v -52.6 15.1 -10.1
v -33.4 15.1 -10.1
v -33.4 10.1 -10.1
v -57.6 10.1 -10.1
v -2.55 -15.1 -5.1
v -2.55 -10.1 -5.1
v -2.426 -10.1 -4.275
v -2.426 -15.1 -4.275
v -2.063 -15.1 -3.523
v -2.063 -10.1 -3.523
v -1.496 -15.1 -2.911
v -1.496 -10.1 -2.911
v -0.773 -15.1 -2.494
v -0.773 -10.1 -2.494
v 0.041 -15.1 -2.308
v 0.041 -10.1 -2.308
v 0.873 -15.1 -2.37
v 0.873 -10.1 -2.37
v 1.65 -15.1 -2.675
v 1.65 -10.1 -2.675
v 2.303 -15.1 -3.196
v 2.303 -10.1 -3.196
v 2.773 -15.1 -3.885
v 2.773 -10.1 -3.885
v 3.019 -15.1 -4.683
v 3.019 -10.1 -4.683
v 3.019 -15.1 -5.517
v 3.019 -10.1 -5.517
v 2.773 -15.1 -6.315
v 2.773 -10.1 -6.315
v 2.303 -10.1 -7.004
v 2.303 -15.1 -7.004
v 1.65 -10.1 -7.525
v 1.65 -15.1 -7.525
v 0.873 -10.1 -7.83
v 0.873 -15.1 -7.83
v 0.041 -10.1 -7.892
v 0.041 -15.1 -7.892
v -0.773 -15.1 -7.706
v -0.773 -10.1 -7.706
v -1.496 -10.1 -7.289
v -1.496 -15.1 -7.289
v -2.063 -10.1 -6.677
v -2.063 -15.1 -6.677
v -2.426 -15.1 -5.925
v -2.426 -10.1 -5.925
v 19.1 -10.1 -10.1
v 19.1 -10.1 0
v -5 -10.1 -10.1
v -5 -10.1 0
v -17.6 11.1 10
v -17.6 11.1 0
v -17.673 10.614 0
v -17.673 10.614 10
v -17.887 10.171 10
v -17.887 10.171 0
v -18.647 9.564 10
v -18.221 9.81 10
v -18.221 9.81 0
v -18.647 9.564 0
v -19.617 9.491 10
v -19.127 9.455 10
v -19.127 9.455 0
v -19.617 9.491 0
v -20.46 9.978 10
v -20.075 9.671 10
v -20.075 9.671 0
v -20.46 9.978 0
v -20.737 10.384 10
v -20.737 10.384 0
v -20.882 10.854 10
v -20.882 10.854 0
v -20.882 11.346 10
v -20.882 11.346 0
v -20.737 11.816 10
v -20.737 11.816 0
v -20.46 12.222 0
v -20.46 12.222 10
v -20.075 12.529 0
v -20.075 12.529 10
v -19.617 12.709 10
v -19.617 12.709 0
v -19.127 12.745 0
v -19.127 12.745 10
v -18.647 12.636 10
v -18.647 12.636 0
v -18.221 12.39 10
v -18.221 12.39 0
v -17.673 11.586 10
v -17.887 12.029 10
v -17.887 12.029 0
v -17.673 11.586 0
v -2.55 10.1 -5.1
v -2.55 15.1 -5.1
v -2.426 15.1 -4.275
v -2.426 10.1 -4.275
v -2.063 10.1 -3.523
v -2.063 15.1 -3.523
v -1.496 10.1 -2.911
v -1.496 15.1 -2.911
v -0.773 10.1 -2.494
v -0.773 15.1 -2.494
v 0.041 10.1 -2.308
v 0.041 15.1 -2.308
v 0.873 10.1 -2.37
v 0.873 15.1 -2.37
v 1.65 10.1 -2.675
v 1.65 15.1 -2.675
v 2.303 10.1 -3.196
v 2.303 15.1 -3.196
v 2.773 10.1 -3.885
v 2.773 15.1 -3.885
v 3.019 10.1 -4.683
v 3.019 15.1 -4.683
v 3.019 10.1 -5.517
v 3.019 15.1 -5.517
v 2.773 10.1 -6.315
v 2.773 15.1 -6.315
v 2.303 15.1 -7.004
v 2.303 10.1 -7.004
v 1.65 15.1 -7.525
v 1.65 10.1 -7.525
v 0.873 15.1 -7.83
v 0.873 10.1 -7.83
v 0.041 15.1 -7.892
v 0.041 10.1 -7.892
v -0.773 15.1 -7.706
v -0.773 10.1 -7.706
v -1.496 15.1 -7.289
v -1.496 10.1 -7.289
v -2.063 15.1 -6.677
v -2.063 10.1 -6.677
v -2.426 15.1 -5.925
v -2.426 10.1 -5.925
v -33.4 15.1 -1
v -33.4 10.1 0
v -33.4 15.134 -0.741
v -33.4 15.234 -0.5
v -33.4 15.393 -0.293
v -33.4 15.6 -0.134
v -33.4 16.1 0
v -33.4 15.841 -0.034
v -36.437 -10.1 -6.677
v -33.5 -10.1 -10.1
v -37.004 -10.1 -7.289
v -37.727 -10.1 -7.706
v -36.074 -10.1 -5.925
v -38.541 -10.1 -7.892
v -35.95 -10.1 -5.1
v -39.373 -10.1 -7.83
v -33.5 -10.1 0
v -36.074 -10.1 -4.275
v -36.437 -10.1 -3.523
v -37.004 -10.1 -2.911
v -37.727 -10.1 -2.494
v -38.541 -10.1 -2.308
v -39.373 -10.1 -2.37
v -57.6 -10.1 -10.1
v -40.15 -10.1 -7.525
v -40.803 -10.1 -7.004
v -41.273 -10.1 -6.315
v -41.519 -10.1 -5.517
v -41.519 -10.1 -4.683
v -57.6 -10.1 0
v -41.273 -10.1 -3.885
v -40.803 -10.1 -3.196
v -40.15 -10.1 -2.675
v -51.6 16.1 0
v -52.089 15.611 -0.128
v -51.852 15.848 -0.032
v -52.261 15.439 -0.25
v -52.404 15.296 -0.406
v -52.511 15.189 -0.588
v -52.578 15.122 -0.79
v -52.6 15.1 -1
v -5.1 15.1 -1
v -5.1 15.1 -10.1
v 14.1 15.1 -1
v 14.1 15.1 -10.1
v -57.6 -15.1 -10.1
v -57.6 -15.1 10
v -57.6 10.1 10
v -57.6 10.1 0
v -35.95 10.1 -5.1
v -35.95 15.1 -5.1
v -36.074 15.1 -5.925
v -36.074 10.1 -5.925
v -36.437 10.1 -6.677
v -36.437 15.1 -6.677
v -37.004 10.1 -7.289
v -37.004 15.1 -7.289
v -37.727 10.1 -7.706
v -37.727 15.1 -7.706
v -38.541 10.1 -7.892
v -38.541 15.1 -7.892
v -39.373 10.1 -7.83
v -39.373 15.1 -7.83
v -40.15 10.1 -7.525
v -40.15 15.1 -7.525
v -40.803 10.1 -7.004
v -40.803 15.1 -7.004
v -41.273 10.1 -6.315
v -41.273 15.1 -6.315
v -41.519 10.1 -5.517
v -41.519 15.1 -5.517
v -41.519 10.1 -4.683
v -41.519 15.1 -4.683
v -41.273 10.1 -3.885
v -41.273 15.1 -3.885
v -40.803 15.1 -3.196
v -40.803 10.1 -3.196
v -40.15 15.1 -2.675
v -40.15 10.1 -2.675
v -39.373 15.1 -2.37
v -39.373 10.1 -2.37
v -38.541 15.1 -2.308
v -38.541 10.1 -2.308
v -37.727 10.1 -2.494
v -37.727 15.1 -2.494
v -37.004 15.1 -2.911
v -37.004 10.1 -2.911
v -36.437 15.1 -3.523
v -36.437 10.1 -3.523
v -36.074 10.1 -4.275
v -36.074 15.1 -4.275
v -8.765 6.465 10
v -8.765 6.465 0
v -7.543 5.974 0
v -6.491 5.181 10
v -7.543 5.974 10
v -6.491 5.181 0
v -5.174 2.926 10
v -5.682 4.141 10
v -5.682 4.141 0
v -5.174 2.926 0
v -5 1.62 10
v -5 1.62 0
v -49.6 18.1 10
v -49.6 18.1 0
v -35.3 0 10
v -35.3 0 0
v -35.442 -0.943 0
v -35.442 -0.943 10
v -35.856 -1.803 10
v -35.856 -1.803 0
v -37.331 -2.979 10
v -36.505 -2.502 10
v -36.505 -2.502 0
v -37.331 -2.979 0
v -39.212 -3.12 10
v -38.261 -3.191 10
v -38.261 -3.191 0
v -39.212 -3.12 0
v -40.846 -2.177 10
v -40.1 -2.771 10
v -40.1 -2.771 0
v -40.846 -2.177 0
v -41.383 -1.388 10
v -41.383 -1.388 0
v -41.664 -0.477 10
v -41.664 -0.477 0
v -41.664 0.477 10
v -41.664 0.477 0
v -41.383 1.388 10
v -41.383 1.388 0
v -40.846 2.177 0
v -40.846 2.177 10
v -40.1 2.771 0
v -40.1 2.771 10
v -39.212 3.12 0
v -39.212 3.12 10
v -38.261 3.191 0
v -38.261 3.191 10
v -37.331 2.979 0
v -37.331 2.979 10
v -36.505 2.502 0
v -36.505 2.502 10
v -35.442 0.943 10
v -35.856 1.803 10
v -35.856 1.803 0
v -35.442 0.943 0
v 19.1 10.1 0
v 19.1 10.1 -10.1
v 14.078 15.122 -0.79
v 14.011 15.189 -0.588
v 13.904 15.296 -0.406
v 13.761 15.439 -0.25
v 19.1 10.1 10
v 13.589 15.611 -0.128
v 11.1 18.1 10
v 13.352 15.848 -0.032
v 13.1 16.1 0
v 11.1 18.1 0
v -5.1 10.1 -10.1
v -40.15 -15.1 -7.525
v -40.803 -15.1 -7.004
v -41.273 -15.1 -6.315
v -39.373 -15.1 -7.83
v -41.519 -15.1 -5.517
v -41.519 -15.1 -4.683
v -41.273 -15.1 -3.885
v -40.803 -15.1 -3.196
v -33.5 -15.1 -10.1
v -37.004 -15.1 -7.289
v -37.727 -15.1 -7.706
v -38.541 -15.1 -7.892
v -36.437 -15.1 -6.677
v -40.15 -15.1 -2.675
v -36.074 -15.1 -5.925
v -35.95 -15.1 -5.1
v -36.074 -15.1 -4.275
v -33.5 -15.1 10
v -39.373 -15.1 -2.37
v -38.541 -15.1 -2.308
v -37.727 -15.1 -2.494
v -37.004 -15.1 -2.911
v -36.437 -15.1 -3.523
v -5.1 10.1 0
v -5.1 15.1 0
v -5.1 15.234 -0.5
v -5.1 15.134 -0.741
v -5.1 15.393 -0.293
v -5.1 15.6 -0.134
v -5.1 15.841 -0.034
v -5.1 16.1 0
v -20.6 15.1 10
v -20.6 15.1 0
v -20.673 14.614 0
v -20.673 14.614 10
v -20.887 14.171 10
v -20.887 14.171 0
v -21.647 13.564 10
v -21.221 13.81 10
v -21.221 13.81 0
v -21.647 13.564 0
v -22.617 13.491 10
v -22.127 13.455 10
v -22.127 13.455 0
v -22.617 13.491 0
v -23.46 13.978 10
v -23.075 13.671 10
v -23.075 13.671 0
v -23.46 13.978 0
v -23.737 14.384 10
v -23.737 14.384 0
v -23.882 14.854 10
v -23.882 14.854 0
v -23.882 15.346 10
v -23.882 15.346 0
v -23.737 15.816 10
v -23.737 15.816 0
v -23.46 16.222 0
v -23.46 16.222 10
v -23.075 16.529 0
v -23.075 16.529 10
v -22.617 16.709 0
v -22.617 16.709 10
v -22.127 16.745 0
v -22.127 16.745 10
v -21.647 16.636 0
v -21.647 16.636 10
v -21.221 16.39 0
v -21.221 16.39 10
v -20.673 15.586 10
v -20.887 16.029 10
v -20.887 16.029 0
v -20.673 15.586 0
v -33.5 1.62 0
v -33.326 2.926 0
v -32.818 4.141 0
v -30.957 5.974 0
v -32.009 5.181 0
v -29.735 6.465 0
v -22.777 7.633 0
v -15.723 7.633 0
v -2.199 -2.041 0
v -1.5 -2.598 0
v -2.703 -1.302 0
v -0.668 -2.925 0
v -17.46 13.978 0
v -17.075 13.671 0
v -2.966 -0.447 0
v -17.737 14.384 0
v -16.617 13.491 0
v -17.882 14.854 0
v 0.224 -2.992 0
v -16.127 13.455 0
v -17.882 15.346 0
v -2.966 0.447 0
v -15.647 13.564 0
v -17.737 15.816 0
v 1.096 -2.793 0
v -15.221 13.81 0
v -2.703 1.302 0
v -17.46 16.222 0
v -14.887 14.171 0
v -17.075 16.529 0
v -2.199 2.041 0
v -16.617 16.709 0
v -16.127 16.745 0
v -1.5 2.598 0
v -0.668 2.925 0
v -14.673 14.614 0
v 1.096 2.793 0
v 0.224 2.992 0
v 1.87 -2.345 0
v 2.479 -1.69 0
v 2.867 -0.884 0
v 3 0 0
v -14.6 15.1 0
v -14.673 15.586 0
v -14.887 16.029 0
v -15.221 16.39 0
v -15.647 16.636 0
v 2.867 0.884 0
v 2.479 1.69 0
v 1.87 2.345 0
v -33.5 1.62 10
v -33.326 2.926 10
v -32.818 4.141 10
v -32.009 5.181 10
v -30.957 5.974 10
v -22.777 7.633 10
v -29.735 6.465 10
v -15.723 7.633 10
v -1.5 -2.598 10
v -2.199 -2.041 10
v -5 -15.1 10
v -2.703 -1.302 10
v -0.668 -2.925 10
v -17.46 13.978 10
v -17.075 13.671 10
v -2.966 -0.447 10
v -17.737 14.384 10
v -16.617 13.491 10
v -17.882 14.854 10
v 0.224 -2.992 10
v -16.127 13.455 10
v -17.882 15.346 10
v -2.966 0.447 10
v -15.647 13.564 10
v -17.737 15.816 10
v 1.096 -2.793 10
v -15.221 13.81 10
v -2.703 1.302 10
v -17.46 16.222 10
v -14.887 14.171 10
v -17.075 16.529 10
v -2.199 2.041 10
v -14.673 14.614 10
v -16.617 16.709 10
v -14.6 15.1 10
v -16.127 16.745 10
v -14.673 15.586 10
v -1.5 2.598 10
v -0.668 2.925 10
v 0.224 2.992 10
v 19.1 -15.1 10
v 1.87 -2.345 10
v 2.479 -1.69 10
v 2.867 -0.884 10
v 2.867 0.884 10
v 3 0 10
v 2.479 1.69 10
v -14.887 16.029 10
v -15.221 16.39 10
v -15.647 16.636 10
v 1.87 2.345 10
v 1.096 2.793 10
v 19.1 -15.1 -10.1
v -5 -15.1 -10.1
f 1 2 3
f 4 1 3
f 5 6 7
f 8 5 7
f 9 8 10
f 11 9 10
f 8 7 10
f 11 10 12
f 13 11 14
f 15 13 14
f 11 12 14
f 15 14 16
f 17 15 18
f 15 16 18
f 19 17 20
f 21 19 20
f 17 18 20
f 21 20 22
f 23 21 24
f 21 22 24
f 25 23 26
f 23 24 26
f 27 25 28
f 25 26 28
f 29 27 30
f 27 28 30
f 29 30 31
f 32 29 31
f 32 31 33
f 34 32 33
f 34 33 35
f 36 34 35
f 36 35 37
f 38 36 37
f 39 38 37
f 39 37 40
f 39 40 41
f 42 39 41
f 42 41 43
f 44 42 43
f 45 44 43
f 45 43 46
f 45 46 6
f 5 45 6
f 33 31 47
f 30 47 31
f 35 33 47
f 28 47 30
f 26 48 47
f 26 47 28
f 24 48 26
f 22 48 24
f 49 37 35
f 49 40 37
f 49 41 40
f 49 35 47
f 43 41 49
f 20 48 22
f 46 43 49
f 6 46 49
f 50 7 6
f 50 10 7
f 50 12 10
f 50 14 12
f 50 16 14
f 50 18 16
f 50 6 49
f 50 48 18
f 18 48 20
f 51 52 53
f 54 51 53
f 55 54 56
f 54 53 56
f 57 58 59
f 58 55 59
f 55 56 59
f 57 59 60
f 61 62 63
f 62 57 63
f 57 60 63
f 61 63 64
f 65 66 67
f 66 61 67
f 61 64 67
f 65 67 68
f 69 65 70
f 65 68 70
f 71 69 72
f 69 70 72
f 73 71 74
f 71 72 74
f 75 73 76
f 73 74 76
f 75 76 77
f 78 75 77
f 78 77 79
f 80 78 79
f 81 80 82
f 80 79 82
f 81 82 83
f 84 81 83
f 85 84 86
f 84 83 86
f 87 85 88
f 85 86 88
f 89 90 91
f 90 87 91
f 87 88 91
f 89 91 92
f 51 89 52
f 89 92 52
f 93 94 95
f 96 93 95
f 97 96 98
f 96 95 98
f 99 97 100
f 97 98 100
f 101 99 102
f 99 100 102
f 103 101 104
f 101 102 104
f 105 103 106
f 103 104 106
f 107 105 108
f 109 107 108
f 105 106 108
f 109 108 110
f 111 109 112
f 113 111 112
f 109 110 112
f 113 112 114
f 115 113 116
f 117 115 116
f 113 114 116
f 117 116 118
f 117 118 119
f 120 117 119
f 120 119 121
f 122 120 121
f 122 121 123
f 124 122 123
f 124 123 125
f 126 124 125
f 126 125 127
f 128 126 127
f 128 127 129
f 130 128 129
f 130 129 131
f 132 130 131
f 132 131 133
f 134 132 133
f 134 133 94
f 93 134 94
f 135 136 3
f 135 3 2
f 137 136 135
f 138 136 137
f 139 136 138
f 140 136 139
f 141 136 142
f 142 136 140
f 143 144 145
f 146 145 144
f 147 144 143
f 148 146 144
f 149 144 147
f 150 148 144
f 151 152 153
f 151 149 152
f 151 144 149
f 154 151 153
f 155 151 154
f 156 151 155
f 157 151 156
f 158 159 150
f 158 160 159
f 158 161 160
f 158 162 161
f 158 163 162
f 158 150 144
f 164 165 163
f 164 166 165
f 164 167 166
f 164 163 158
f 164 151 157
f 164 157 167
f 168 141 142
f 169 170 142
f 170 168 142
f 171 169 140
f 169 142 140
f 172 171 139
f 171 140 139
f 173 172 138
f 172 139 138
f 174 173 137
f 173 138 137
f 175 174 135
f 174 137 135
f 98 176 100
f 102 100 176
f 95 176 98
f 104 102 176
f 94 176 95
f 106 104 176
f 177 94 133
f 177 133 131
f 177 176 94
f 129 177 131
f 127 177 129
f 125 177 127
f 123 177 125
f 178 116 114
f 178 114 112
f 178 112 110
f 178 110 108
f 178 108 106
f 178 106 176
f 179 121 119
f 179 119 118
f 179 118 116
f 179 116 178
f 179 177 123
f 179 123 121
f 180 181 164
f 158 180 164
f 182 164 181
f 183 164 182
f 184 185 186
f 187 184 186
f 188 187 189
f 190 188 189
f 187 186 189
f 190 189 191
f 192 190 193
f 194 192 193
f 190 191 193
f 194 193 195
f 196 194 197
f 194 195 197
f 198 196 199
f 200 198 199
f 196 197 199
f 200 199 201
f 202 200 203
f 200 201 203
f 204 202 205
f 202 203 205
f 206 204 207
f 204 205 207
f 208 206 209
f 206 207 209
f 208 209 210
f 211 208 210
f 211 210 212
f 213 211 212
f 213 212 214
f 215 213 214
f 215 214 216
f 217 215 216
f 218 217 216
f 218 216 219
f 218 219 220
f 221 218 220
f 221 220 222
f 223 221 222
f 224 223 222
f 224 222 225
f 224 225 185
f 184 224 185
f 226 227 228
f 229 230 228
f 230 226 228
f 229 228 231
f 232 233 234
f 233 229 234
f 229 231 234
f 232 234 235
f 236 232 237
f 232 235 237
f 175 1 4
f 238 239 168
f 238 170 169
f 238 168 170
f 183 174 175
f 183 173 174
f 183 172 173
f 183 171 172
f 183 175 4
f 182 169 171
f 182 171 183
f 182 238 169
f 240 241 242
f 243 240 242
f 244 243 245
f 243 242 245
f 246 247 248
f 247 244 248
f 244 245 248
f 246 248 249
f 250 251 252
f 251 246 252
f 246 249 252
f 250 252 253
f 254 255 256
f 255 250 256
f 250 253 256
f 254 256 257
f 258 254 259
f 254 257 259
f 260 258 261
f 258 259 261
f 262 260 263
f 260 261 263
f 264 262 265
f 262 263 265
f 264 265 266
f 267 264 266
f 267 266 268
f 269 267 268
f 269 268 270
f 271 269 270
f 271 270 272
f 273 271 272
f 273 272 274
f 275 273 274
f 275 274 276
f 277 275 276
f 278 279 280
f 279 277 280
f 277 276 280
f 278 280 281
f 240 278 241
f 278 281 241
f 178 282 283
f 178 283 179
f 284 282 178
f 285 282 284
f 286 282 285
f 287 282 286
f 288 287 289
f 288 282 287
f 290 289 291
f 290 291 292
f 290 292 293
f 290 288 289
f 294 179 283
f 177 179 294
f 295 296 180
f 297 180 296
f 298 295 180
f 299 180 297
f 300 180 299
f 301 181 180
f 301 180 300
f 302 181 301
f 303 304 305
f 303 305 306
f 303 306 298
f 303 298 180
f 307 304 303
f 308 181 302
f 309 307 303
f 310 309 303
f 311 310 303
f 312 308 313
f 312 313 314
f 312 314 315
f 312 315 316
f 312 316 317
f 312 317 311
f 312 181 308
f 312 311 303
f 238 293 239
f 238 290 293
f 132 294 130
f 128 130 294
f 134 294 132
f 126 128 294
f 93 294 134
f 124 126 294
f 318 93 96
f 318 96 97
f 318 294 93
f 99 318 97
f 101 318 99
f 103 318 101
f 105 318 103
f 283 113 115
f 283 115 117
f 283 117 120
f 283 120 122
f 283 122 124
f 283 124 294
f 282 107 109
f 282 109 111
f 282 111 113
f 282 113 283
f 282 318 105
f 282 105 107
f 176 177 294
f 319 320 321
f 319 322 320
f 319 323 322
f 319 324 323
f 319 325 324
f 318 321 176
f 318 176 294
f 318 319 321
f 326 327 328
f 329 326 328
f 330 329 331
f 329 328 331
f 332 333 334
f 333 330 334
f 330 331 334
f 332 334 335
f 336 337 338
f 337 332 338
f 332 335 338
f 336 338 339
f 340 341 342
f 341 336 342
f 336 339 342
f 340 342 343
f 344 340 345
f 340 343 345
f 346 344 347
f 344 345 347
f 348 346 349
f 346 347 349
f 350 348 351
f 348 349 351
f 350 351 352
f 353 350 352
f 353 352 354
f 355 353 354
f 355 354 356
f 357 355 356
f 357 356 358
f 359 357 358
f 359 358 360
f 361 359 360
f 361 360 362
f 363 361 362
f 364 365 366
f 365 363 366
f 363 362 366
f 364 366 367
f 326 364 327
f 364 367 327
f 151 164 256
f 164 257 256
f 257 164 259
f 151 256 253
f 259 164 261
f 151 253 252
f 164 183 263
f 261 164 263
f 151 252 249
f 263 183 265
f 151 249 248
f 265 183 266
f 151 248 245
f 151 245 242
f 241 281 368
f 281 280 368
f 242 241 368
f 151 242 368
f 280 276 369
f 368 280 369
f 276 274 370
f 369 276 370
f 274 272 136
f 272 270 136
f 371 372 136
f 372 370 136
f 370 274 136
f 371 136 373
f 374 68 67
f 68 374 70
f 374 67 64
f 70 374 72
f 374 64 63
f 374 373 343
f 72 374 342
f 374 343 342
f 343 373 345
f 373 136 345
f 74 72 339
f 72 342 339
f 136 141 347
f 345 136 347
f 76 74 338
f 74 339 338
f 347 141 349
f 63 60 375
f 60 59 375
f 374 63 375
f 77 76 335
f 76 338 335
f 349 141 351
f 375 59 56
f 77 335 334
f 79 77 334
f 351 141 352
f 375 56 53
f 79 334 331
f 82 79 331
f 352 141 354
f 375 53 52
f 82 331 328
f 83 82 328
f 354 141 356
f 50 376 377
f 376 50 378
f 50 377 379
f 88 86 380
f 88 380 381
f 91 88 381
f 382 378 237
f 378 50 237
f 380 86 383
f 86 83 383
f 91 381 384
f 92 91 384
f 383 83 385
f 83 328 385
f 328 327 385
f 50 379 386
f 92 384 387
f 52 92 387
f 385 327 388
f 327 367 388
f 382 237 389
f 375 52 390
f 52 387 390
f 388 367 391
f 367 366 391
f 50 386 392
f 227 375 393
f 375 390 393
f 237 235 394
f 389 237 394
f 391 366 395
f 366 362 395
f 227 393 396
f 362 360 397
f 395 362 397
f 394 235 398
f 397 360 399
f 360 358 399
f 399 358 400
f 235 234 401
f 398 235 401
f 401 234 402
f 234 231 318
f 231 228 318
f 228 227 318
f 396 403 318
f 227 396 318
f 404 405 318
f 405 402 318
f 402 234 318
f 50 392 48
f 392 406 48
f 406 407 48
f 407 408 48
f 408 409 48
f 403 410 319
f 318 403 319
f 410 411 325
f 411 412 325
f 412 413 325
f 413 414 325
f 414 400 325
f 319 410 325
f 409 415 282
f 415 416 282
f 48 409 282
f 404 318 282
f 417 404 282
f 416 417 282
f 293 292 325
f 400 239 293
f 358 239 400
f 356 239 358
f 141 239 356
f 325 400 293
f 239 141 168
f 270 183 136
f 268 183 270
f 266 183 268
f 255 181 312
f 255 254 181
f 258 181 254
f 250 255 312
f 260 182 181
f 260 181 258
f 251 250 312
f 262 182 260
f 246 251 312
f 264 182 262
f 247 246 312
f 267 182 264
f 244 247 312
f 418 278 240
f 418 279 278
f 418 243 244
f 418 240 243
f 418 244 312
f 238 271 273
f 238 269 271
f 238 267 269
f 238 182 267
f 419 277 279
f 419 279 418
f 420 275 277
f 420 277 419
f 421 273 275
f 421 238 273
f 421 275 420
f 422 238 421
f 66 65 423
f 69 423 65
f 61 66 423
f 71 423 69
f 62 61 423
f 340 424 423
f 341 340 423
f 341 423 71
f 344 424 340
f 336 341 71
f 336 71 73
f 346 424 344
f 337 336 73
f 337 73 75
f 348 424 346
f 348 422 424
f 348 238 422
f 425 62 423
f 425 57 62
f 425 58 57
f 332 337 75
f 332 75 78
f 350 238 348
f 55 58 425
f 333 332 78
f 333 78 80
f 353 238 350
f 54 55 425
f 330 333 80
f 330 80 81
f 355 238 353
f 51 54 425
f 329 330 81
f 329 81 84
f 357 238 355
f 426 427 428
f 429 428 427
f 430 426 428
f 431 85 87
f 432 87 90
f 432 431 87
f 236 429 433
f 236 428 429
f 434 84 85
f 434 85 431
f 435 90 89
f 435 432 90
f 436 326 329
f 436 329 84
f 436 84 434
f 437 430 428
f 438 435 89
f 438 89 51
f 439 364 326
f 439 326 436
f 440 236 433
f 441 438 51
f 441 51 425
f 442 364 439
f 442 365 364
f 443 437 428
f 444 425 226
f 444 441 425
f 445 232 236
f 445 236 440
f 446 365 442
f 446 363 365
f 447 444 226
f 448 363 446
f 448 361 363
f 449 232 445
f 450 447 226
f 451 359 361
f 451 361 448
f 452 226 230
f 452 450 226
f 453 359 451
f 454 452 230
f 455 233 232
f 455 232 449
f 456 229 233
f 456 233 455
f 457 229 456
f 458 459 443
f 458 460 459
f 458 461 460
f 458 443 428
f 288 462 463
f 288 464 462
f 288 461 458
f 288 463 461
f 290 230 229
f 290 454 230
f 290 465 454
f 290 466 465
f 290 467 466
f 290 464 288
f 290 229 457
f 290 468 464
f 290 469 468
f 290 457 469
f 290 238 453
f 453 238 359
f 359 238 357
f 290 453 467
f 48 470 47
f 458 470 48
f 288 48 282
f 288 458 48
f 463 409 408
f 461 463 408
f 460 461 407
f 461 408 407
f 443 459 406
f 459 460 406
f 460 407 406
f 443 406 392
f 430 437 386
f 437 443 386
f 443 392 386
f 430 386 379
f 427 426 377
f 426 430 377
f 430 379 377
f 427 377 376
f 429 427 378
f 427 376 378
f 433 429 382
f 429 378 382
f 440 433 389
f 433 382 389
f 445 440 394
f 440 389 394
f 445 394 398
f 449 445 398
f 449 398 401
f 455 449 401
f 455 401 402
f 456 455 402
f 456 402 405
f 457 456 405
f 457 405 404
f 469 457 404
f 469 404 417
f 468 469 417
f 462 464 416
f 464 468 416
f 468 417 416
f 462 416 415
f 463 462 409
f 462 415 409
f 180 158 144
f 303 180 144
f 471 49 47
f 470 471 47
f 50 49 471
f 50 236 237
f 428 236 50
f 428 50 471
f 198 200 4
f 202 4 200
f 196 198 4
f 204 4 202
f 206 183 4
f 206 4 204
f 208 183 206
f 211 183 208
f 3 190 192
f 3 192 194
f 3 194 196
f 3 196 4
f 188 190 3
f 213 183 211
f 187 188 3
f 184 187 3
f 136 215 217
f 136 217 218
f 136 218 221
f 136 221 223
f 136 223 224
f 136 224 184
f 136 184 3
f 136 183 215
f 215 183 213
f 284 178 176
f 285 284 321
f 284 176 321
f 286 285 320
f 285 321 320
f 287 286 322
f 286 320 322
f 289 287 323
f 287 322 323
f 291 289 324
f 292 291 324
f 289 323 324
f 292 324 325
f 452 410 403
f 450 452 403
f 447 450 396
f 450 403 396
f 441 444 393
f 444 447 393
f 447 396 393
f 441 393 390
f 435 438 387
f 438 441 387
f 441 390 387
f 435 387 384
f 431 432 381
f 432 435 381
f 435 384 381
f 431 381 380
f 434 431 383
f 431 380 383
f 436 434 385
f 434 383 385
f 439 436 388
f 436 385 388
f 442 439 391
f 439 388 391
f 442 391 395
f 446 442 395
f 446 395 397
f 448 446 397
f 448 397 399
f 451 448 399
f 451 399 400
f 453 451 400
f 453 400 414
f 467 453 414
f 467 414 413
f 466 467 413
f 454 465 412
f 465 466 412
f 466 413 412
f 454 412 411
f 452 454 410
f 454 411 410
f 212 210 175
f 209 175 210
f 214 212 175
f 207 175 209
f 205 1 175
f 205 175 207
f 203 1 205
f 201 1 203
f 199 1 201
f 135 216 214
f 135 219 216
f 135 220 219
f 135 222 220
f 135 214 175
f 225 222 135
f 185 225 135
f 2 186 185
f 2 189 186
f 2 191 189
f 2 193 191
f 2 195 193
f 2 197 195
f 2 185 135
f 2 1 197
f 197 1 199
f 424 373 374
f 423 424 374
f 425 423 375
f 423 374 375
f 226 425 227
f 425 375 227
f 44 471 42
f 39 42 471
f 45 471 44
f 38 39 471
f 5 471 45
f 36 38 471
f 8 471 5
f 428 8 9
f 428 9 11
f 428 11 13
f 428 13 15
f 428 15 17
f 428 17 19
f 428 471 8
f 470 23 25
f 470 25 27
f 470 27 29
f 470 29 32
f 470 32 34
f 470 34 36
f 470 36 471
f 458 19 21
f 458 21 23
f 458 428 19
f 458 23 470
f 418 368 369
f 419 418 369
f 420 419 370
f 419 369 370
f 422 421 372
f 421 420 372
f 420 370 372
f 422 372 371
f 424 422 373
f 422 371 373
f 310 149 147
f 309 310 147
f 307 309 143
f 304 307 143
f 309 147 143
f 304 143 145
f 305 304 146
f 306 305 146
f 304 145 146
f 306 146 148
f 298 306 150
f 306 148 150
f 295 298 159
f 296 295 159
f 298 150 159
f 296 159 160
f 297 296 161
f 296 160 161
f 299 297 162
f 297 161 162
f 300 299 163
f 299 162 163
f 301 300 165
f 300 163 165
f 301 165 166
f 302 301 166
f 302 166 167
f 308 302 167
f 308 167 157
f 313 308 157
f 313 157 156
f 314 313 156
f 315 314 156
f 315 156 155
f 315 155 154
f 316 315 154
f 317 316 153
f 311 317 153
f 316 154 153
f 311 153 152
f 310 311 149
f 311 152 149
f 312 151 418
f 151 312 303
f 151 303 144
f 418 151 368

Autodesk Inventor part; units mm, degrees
ref_plane "YZ Plane" through (0, 0, 0) normal (1, 0, 0) x (0, 1, 0)
sketch "Sketch1" plane through (0, 0, 0) normal (0, 0, 1) x (1, 0, 0)
  circle A0 centre (0, 0) radius 3.1 construction
  line L0 (-5, 10) -> (-5, -10) projected
  line L1 (-5, -10) -> (19.1, -10) construction
  line L2 (19.1, -10) -> (19.1, 10) projected
  line L3 (19.1, 10) -> (-5, 10) construction
  line L4 (-33.5, -10) -> (-33.5, 10) projected
  line L5 (-33.5, 10) -> (-57.6, 10) construction
  line L6 (-57.6, -10) -> (-57.6, 10) projected
  line L7 (-57.6, -10) -> (-33.5, -10) construction
  circle A1 centre (-38.5, 0) radius 3.1 construction
  line L8 (-25.05, 5.3172) -> (-13.45, 5.3172) projected
  line L9 (19.1, -10.1) -> (-5, -10.1)
  line L10 (-5, -10.1) -> (-5, 1.6198)
  line L11 (-5, 10.1) -> (19.1, 10.1)
  line L12 (19.1, 10.1) -> (19.1, -10.1)
  line L13 (-33.5, -10.1) -> (-57.6, -10.1)
  line L14 (-57.6, -10.1) -> (-57.6, 10.1)
  line L15 (-57.6, 10.1) -> (-33.5, 10.1)
  line L16 (-33.5, 1.6198) -> (-33.5, -10.1)
  circle A2 centre (-38.5, 0) radius 3.2
  circle A3 centre (0, 0) radius 3
  arc A4 (-8.7654, 6.465) -> (-29.7346, 6.465) centre (-19.25, -34.6828) ccw
  line L17 (11.1, 18.1) -> (-49.6, 18.1)
  line L18 (-19.25, 5.3172) -> (-19.25, 9.0349) construction
  circle A5 centre (-16.25, 15.1) radius 1.65
  circle A6 centre (-22.25, 15.1) radius 1.65
  line L19 (11.1, 18.1) -> (19.1, 10.1)
  line L20 (-49.6, 18.1) -> (-57.6, 10.1)
  arc A7 (-29.7346, 6.465) -> (-33.5, 1.6198) centre (-28.5, 1.6198) ccw
  arc A8 (-5, 1.6198) -> (-8.7654, 6.465) centre (-10, 1.6198) ccw
  circle A9 centre (-19.25, 11.1) radius 1.65
  circle A10 centre (-19.25, 11.1) radius 1.65
  point P0 (0, 0)
  point P1 (-5, 5.3172)
  point P2 (-33.5, 5.3172)
  point P3 (-19.25, 18.1)
  point P4 (-5, 5.3172)
  point P5 (19.1, 10)
  point P6 (-33.5, 1.6198)
  point P7 (-5, 1.6198)
  dimension "d0" = 0.1
  dimension "d1" = 0.1
  dimension "d2" = 0.1
  dimension "d3" = 0.1
  dimension "d4" = 0.1
  dimension "d5" = 0.1
  dimension "d7" = 40
  dimension "d9" = 8
  dimension "d10" = 3
  dimension "d11" = 3.3
  dimension "d12" = 3
  dimension "d13" = 45
  dimension "d16" = 5
  dimension "d17" = 3.3
  dimension "d19" = 7
extrude "Extrusion1" add sketch "Sketch1" along normal blind 10
ref_plane "Work Plane1" through (-43.1, -10, -10.1) normal (0, 0, -1) x (0, 1, 0)
sketch "Sketch3" plane through (0, 0, 10) normal (0, 0, 1) x (1, 0, 0)
  line L0 (-33.5, -10.1) -> (-33.5, 1.6198) projected
  line L1 (-33.5, -10.1) -> (-57.6, -10.1)
  line L2 (-57.6, -10.1) -> (-57.6, -15.1)
  line L3 (-57.6, -15.1) -> (-33.5, -15.1)
  line L4 (-33.5, -15.1) -> (-33.5, -10.1)
  line L5 (-57.6, 10.1) -> (-57.6, -10.1) projected
  point P0 (0, 0)
  dimension "d25" = 5
extrude "Extrusion3" add sketch "Sketch3" against normal up to surface (20.1 mm away)
sketch "Sketch4" plane through (0, 0, 0) normal (0, 0, -1) x (-1, 0, 0)
  line L0 (33.5, -10) -> (33.5, 10) construction
  line L1 (33.5, 10) -> (57.6, 10) construction
  line L2 (57.6, -10) -> (57.6, 10) construction
  line L3 (57.6, -10) -> (33.5, -10) construction
  circle A0 centre (38.5, 0) radius 3.1 construction
  line L4 (-19.1, -10.1) -> (-19.1, 10.1) construction
  line L5 (5, -10.1) -> (-19.1, -10.1) construction
  line L6 (5, 1.6198) -> (5, -10.1) construction
  arc A1 (8.7654, 6.465) -> (5, 1.6198) centre (10, 1.6198) ccw construction
  arc A2 (29.7346, 6.465) -> (8.7654, 6.465) centre (19.25, -34.6828) ccw construction
  arc A3 (33.5, 1.6198) -> (29.7346, 6.465) centre (28.5, 1.6198) ccw construction
  line L7 (33.5, -10.1) -> (33.5, 1.6198) construction
  line L8 (57.6, -10.1) -> (33.5, -10.1) construction
  line L9 (57.6, 10.1) -> (57.6, -10.1) construction
  line L10 (49.6, 18.1) -> (57.6, 10.1) projected
  line L11 (-11.1, 18.1) -> (49.6, 18.1) construction
  line L12 (-19.1, 10.1) -> (-11.1, 18.1) construction
  circle A4 centre (19.25, 11.1) radius 1.65 construction
  circle A5 centre (16.25, 15.1) radius 1.65 construction
  circle A6 centre (0, 0) radius 3 construction
  circle A7 centre (38.5, 0) radius 3.2 construction
  circle A8 centre (22.25, 15.1) radius 1.65 construction
  line L13 (57.7, 10.1) -> (33.4, 10.1)
  line L14 (33.4, 10.1) -> (33.4, -10.1) construction
  line L15 (33.4, -10.1) -> (57.7, -10.1) construction
  line L16 (57.7, -10.1) -> (57.7, 10.1) construction
  line L17 (33.4, 10.1) -> (33.4, 18.1)
  line L18 (-11.1, 18.1) -> (49.6, 18.1) projected
  line L19 (49.6, 18.1) -> (57.6, 10.1) projected
  line L20 (33.4, 18.1) -> (49.6, 18.1)
  point P0 (0, 0)
  dimension "d28" = 0.1
ref_plane "Work Plane2" through (-43.1, -10, -10.1) normal (0, 0, -1) x (0, 1, 0)
extrude "Extrusion4" add sketch "Sketch4" along normal up to surface (10.1 mm away)
sketch "Sketch5" plane through (-49.6, 18.1, 10) normal (0, 1, 0) x (1, 0, 0)
  line L0 (16.1, 20.1) -> (16.1, 10.1) construction
  line L1 (-8, 10.1) -> (16.1, 10.1) construction
  line L2 (-8, 302.9) -> (-8, 10.1) construction
  line L3 (-8, 302.9) -> (68.7, 302.9) construction
  line L4 (68.7, 10.1) -> (68.7, 302.9) construction
  line L5 (44.6, 10.1) -> (68.7, 10.1) construction
  line L6 (44.6, 10.1) -> (44.6, 20.1) construction
  line L7 (44.6, 20.1) -> (54.2, 20.1) construction
  arc A0 (54.2, 20.1) -> (59.2, 25.1) centre (54.2, 25.1) ccw construction
  line L8 (59.2, 175.1) -> (59.2, 25.1) construction
  arc A1 (59.2, 175.1) -> (54.2, 180.1) centre (54.2, 175.1) ccw construction
  line L9 (6.5, 180.1) -> (54.2, 180.1) construction
  arc A2 (6.5, 180.1) -> (1.5, 175.1) centre (6.5, 175.1) ccw construction
  line L10 (1.5, 25.1) -> (1.5, 175.1) construction
  arc A3 (1.5, 25.1) -> (6.5, 20.1) centre (6.5, 25.1) ccw construction
  line L11 (16.1, 20.1) -> (6.5, 20.1) construction
  circle A4 centre (63.7, 292.9) radius 2.15 construction
  circle A5 centre (-3, 273) radius 2.15 construction
  circle A6 centre (-3, 292.9) radius 2.15 construction
  circle A7 centre (63.7, 273) radius 2.15 construction
  circle A8 centre (10.85, 15.1) radius 2.5 construction
  circle A9 centre (49.85, 15.1) radius 2.5 construction
  line L12 (-8, 10) -> (-8, 20.1) projected
  line L13 (16.2, 10) -> (16.2, 20.1) projected
  line L14 (-8, 10) -> (16.2, 10)
  line L15 (16.2, 10) -> (16.2, 20.1)
  line L16 (16.2, 20.1) -> (-8, 20.1)
  line L17 (-8, 20.1) -> (-8, 10)
  point P0 (49.6, 10)
extrude "Extrusion5" cut sketch "Sketch5" against normal blind 3
sketch "Sketch6" plane through (-49.6, 15.1, 10) normal (0, 1, 0) x (1, 0, 0)
  circle A0 centre (10.85, 15.1) radius 2.5 construction
  circle A1 centre (10.85, 15.1) radius 2.8
  point P0 (49.6, 10)
  dimension "d33" = 0.3
extrude "Extrusion6" cut sketch "Sketch6" against normal through all
fillet "Fillet2" radius 1 1 edges at (-43, 15.1, 0)
ref_plane "Work Plane3" through (-19.25, -15.1, 10) normal (-1, 0, 0) x (0, 0, 1)
mirror "Mirror1" about plane through (-19.25, -15.1, 10) normal (-1, 0, 0) of "Extrusion3", "Extrusion4", "Extrusion5", "Extrusion6", "Fillet2"
ref_plane "Work Plane4" through (4.6, -10, -10.1) normal (0, 0, 1) x (0, 1, 0)
equation "\"d17\" = d11"
properties part number "pivot module base"
